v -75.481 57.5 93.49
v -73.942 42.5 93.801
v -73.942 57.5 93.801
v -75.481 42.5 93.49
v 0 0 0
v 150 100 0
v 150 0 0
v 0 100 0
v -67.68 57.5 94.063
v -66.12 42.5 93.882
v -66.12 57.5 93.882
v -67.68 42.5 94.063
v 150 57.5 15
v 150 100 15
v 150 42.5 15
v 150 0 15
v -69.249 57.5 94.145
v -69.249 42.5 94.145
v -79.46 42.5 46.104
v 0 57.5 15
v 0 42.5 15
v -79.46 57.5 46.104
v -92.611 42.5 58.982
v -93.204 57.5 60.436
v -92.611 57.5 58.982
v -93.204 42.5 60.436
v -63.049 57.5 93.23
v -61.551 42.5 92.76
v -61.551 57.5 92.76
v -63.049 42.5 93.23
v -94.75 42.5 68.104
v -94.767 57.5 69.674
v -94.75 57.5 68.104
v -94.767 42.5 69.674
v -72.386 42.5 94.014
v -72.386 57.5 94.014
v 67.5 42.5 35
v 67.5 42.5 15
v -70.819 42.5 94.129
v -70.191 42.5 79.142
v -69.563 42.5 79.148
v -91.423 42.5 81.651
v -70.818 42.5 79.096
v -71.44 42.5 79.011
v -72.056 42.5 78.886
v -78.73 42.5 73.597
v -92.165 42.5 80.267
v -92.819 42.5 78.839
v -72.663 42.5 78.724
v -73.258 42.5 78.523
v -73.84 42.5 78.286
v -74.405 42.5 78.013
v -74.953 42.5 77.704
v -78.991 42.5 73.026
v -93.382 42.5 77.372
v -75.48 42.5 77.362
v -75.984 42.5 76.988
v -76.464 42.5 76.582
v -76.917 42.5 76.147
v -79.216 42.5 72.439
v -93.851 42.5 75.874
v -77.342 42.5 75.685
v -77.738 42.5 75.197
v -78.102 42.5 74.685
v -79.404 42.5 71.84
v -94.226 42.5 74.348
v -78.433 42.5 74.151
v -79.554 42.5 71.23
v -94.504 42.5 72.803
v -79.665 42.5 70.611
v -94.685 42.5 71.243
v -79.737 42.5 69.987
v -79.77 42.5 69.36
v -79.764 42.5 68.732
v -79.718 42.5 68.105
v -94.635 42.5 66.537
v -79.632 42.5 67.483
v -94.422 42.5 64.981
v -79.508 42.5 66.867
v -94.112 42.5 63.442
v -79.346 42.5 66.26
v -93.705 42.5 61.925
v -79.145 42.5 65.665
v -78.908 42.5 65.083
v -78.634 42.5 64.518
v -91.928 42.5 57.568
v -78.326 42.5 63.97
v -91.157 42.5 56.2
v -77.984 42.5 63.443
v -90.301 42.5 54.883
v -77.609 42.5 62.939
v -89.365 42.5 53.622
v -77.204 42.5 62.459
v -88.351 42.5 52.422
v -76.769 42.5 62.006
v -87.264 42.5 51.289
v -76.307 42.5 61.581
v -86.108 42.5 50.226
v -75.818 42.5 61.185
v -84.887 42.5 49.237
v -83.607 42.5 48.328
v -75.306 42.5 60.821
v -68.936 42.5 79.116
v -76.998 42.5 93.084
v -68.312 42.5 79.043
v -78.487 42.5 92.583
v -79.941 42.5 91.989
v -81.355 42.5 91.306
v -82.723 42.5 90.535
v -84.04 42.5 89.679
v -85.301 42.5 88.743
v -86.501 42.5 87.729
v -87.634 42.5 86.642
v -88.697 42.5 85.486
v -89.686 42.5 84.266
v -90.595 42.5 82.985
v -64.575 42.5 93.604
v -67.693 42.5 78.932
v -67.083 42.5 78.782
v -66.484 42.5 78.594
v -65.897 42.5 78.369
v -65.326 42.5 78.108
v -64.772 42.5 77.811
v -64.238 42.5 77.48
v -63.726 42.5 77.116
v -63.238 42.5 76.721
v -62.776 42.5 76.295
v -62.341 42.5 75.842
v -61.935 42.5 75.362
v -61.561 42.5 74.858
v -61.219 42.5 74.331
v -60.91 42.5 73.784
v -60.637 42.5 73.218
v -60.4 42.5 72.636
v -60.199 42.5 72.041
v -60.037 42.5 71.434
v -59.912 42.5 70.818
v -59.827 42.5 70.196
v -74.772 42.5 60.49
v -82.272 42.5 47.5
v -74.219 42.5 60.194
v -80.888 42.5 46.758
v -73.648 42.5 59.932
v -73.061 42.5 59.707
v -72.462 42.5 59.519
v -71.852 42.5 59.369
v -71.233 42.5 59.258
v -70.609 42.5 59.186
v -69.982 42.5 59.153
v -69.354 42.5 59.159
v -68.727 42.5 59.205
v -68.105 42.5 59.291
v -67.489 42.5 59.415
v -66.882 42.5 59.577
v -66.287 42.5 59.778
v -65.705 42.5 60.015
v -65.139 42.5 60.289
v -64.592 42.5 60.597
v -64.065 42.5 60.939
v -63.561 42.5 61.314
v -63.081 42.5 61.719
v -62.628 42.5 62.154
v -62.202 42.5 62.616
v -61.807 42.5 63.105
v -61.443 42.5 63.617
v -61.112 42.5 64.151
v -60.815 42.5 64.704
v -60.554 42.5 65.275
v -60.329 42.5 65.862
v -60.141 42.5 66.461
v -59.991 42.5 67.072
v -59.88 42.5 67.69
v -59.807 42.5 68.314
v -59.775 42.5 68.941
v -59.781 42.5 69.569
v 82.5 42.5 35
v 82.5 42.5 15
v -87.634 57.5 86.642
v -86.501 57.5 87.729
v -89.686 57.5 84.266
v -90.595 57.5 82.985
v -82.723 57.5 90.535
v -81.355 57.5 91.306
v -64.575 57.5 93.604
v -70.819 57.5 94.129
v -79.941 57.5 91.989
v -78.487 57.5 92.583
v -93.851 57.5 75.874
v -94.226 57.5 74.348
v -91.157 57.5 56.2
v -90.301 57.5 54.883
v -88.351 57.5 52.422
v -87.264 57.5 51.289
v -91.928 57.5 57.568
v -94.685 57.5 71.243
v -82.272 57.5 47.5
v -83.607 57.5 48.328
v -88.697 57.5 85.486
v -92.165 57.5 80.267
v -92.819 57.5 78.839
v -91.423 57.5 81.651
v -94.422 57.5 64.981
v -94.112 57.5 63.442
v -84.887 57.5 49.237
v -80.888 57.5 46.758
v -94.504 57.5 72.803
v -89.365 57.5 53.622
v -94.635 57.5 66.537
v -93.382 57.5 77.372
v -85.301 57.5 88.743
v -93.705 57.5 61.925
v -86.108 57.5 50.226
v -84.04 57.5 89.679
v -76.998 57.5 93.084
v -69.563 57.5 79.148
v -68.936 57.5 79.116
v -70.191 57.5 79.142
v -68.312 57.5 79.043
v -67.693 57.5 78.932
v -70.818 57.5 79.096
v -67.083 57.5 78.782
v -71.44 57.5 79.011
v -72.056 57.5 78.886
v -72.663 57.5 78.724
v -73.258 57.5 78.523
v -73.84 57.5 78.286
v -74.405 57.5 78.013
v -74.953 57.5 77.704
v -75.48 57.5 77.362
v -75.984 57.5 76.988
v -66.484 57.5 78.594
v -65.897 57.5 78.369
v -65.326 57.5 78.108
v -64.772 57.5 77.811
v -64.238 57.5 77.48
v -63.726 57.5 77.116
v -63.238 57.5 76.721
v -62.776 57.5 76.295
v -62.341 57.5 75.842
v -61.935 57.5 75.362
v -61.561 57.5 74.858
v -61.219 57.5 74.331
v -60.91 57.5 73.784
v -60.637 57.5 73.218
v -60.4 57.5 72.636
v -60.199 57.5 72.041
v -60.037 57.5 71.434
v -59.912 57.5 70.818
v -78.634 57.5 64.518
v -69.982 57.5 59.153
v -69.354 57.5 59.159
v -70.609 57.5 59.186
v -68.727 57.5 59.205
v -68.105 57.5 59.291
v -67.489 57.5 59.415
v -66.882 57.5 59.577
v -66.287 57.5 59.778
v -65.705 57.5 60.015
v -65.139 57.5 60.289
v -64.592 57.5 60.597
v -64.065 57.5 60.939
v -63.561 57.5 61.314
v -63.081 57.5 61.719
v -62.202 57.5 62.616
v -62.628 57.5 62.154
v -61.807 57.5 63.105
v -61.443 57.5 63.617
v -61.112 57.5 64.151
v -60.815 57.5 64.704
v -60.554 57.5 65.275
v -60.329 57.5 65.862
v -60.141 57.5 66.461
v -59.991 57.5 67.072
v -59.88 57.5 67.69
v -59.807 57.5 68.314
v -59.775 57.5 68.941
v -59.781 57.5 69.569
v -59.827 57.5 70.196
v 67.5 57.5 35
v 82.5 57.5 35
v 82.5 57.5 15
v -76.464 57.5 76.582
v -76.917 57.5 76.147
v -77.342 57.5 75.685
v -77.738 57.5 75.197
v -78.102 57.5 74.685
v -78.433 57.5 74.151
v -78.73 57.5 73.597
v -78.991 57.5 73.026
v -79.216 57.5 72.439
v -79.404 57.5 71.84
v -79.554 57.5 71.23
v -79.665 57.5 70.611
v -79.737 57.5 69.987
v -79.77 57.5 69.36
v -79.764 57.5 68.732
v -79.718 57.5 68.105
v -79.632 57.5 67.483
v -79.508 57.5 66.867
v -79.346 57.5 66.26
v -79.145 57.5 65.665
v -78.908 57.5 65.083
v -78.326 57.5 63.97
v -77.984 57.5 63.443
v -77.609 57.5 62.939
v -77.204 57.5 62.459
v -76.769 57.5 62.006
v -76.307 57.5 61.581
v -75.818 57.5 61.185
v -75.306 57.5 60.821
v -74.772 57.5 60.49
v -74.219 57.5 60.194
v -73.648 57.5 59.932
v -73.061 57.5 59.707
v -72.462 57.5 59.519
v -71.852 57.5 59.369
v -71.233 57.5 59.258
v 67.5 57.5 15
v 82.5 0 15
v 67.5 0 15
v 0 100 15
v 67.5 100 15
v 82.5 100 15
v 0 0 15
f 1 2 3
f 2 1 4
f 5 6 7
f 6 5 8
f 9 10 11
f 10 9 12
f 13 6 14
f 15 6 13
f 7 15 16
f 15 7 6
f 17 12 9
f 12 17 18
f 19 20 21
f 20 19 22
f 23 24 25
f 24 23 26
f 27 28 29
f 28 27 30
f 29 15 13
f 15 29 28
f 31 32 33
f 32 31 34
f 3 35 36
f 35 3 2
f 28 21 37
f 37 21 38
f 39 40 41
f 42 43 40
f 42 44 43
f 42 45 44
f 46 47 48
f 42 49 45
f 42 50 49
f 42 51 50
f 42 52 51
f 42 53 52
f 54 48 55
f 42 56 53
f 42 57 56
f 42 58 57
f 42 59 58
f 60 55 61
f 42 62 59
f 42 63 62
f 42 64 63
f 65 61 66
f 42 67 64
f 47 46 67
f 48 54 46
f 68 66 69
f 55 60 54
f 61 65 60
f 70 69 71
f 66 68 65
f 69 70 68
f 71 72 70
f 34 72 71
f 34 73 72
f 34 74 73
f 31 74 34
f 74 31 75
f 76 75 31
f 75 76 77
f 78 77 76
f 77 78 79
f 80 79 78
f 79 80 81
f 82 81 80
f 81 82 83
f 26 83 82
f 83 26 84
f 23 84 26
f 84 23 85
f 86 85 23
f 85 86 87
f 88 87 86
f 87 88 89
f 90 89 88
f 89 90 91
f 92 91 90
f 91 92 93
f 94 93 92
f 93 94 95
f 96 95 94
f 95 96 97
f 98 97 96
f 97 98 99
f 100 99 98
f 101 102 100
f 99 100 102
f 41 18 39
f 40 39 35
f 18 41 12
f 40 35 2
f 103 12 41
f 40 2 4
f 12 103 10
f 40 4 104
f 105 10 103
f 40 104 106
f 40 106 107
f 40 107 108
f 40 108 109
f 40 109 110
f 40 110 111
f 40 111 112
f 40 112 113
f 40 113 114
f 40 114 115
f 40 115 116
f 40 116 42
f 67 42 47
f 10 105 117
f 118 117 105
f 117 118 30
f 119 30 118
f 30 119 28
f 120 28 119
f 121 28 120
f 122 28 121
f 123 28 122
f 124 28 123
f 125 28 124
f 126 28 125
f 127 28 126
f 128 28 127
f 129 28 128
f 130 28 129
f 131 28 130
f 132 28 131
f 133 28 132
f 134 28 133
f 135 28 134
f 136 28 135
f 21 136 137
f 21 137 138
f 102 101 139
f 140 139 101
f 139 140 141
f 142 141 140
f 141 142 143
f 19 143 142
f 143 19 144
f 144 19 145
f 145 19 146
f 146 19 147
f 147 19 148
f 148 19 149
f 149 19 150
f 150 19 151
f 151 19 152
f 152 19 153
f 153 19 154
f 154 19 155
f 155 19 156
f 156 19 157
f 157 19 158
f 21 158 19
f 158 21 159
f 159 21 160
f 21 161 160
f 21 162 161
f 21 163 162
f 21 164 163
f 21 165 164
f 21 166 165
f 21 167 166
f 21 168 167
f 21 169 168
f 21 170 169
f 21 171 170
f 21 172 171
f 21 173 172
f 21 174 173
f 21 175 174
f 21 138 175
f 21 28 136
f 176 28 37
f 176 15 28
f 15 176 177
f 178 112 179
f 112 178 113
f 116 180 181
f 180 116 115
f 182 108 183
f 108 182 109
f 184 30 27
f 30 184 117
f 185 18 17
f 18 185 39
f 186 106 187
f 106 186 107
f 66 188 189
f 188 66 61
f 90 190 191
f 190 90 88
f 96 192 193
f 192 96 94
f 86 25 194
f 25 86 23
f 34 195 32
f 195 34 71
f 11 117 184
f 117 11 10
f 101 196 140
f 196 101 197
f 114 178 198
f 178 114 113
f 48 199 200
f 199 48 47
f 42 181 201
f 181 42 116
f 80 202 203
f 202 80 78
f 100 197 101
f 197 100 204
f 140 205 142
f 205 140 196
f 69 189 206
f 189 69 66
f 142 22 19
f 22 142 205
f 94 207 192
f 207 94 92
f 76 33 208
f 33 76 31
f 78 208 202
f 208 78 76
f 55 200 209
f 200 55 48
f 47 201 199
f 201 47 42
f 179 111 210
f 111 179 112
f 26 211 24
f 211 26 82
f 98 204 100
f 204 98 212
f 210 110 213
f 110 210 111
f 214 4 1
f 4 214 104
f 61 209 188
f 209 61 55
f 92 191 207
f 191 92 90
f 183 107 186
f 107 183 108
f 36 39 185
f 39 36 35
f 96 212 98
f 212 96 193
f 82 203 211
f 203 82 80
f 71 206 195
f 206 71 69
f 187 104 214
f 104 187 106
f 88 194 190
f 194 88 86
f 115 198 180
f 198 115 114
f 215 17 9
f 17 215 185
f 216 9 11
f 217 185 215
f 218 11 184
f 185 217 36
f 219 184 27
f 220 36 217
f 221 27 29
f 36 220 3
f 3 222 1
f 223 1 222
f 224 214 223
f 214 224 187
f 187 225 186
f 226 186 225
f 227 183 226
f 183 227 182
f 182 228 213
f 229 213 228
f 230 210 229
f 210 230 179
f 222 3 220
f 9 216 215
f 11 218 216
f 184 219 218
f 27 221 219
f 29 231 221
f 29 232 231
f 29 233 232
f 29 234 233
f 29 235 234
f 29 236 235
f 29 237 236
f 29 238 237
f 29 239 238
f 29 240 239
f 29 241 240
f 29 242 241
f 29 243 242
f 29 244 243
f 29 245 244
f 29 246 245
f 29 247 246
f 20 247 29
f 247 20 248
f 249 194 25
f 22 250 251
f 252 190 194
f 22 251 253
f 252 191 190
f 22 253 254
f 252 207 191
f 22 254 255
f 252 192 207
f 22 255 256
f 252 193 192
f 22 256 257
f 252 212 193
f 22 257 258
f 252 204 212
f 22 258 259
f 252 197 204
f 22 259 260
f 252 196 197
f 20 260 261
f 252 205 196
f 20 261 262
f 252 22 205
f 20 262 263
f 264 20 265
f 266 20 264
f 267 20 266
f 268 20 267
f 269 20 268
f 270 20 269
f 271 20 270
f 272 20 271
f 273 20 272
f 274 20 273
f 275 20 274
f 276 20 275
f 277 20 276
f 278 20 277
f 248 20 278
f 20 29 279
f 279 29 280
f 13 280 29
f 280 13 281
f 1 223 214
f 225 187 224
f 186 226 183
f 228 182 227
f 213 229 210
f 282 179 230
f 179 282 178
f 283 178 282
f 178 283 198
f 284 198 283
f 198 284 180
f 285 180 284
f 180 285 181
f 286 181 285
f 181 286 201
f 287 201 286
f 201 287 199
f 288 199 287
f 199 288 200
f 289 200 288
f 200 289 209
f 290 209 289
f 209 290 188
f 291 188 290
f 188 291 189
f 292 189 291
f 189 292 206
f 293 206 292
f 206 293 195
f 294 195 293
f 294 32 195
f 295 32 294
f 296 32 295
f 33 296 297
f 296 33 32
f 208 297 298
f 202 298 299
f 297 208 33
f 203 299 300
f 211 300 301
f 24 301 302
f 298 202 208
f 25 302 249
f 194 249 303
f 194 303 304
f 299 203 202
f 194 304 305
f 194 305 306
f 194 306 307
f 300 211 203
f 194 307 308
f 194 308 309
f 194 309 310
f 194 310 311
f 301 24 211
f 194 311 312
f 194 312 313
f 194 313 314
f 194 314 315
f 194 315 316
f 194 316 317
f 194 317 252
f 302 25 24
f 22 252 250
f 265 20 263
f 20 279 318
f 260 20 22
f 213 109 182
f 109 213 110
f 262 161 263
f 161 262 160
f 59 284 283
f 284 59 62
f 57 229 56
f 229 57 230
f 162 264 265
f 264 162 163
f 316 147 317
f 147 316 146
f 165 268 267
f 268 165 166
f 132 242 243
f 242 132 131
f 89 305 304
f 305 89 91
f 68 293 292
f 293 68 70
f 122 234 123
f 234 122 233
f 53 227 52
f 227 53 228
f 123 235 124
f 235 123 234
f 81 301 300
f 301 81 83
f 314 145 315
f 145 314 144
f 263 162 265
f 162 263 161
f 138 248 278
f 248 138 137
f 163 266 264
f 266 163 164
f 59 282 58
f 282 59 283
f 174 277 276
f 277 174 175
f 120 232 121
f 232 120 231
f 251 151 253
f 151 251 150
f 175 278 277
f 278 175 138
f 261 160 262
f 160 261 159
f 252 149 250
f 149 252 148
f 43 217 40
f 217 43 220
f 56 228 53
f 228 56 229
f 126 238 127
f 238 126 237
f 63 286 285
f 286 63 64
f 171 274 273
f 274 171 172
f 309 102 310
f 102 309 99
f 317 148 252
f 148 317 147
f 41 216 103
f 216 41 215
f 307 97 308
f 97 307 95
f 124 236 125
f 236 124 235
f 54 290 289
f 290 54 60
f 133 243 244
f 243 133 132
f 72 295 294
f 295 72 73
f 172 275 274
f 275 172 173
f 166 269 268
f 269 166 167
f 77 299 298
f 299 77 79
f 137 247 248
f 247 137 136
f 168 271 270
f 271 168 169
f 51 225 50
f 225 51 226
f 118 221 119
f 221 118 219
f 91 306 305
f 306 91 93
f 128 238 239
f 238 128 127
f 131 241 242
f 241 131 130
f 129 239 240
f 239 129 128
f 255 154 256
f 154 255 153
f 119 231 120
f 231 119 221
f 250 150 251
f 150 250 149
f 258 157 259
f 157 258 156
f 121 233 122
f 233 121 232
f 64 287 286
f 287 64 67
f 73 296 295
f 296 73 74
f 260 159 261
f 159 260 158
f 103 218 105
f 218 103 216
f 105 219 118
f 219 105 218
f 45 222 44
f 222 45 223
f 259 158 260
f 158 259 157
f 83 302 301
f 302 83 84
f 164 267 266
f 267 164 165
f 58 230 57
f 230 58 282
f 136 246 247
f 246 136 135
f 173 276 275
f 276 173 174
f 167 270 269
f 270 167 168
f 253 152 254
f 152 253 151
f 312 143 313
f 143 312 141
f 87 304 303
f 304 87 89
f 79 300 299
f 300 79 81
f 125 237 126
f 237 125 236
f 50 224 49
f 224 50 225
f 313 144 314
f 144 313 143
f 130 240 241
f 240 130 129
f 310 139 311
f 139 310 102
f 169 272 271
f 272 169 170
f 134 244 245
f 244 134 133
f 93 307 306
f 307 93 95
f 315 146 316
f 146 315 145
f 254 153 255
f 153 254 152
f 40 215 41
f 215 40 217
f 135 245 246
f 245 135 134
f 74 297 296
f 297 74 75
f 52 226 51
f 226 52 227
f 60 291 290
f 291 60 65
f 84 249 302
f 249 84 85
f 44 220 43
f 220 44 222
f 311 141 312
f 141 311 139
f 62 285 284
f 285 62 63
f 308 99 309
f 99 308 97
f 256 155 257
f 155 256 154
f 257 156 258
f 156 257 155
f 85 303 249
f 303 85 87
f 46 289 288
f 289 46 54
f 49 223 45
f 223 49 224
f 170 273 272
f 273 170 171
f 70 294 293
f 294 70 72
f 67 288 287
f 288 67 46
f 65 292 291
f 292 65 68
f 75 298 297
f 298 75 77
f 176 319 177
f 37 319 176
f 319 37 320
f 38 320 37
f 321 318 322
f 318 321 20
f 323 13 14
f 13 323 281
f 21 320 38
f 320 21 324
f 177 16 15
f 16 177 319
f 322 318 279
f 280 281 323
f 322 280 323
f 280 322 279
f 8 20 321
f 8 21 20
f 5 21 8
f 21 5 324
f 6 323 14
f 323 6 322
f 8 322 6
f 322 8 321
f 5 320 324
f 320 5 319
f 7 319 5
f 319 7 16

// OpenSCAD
// file: library.scad
//READ ME


// bug finder
//assert(TranslatX!=undef, "X translation is required");

//Module list
//orbital_cylinders(ObitalDistance ,NumberOfCylinders , cylinderRadius, cylinderHeight);
//anulus(outerRadius, innerRadius, cylinderHeight);
//anulus_cube(outerX, outerY, innerX, innerY, HeightZ);
//cube_cut(DepthX, WidthY, HeightZ, TranslateX, TranslateY, TranslateZ);
//cylinder_cut(cylHeight, cylRadius, TranslateX, TranslateY, TranslateZ, rotateX, rotateY, rotateZ);
//rounded_corner(circleRadius,Thickness);
//triangle(Height, length, Depth);



//------------------------------------------------------------------------------------------------------------------------
module orbital_cylinders(ObitalDistance ,NumberOfCylinders , cylinderRadius, cylinderHeight){
    // Will generate a set of orbiting cylinders base on the values you give it.
    for (Holes = [0:360/NumberOfCylinders:360] ){
        rotate([0, 0, Holes])
        translate([ObitalDistance, 0, 0])
        cylinder(cylinderHeight, r = cylinderRadius);
        }// hehe cuts circles in a circle
        
        // Starting with the DISTANCE from the X ORIGIN to the X EDGE of the circle .ie (Radius)
}       // The obiting cylinders will be evenly spaced starting on the X line.
        // To finish the orbiting cylinders will also be defined in RADIUS,
        // just acted like they're normal cylinders they don't like being called clones.
//------------------------------------------------------------------------------------------------------------------------
module anulus(outerRadius, innerRadius, cylinderHeight){
    difference(){
        cylinder(cylinderHeight, r = outerRadius);
        cylinder(cylinderHeight, r = innerRadius);
        
        }
    }
//------------------------------------------------------------------------------------------------------------------------
module anulus_cube(outerX, outerY, innerX, innerY, HeightZ){
    difference(){
        cube([ outerX, outerY, HeightZ], true);
        cube([ innerX, innerY, HeightZ],true);
        }
    }
//------------------------------------------------------------------------------------------------------------------------
module cube_cut( DepthX, WidthY, HeightZ, TranslateX, TranslateY, TranslateZ ){
    translate([ TranslateX, TranslateY, TranslateZ])
        cube([ DepthX, WidthY, HeightZ]);
    }
//------------------------------------------------------------------------------------------------------------------------
module cylinder_cut(cylHeight, cylRadius, TranslateX, TranslateY, TranslateZ, rotateX, rotateY, rotateZ){
translate([TranslateX, TranslateY, TranslateZ])
    rotate([rotateX, rotateY, rotateZ])
        cylinder(cylHeight, r = cylRadius);
    assert(TranslateY!=undef, "X translation is required"); 
}
//------------------------------------------------------------------------------------------------------------------------
module rounded_corner(circleRadius,Thickness){// Rounds a corner on a cube.
    difference(){
        translate([ -circleRadius, -circleRadius, 0])
            cube([circleRadius * 2, circleRadius * 2, Thickness]); 

        translate([ -circleRadius, -circleRadius * 2, 0])
            cube([circleRadius * 2, circleRadius * 2, Thickness]);

        translate([ -circleRadius * 2, 0, 0])
            cube([circleRadius * 2, circleRadius * 2, Thickness]);

            cylinder(Thickness,r = circleRadius, true);
    }  
    }
//------------------------------------------------------------------------------------------------------------------------
module triangle(Length, Height, Depth){
    linear_extrude(Depth){
        polygon( points = [[0, 0],[Height, 0],[0, Length],[0, 0]]);
    }
        }
    
    
    
    
    
    
    
    
    
    
    
// main file
$fn = 100;
mm = 1;
degree = 1;
diameter = .5;
use <library.scad>

base_Plate();



module base_Plate(){
Triangle_mounts();


baseDepth = 150;
baseWidth = 100;
baseHeight = 15;

cube([baseDepth, baseWidth, baseHeight]);

    module Triangle_mounts(){
        middle_arm();
    
    TriangleHeight = 20;
    TriangleLength = 42.5;
    TriangleDepth = 15;
    TriangleXtranslation = 67.50;
        
    MiddleThickness = 15;

        translate([TriangleDepth + TriangleXtranslation, TriangleLength, baseHeight])
            rotate([90, 0, -90])
                triangle(TriangleHeight, TriangleLength, TriangleDepth);
        
        translate([ TriangleXtranslation, TriangleLength + MiddleThickness, baseHeight])
            rotate([90, 0, 90])
                triangle(TriangleHeight, TriangleLength, TriangleDepth);

            
            module middle_arm(){
            OuterCircle = 25;
            innerCircle = 20 * diameter;
            circleHeight = 15;
            circleTranslation = 80;
             
               difference(){  
                union(){
                   hull(){   
                   hull(){
                       translate([baseDepth / 2, TriangleLength, 0])
                            cube([ baseDepth / 2, MiddleThickness, baseHeight]);
                       
                       translate([0, TriangleLength, baseHeight])
                            cube([ baseDepth / 2, MiddleThickness, baseHeight]);
                       }
                    
              
                  rotate([-90, -60, 0])
                        translate([ OuterCircle, -circleTranslation -baseHeight, TriangleLength])
                            cylinder(circleHeight, r = OuterCircle);
               
             }
              }
                   rotate([-90, -60, 0])
                        translate([ OuterCircle, -circleTranslation -baseHeight, TriangleLength])
                            cylinder(circleHeight, r = innerCircle);
                 
               
}


}
}
}
